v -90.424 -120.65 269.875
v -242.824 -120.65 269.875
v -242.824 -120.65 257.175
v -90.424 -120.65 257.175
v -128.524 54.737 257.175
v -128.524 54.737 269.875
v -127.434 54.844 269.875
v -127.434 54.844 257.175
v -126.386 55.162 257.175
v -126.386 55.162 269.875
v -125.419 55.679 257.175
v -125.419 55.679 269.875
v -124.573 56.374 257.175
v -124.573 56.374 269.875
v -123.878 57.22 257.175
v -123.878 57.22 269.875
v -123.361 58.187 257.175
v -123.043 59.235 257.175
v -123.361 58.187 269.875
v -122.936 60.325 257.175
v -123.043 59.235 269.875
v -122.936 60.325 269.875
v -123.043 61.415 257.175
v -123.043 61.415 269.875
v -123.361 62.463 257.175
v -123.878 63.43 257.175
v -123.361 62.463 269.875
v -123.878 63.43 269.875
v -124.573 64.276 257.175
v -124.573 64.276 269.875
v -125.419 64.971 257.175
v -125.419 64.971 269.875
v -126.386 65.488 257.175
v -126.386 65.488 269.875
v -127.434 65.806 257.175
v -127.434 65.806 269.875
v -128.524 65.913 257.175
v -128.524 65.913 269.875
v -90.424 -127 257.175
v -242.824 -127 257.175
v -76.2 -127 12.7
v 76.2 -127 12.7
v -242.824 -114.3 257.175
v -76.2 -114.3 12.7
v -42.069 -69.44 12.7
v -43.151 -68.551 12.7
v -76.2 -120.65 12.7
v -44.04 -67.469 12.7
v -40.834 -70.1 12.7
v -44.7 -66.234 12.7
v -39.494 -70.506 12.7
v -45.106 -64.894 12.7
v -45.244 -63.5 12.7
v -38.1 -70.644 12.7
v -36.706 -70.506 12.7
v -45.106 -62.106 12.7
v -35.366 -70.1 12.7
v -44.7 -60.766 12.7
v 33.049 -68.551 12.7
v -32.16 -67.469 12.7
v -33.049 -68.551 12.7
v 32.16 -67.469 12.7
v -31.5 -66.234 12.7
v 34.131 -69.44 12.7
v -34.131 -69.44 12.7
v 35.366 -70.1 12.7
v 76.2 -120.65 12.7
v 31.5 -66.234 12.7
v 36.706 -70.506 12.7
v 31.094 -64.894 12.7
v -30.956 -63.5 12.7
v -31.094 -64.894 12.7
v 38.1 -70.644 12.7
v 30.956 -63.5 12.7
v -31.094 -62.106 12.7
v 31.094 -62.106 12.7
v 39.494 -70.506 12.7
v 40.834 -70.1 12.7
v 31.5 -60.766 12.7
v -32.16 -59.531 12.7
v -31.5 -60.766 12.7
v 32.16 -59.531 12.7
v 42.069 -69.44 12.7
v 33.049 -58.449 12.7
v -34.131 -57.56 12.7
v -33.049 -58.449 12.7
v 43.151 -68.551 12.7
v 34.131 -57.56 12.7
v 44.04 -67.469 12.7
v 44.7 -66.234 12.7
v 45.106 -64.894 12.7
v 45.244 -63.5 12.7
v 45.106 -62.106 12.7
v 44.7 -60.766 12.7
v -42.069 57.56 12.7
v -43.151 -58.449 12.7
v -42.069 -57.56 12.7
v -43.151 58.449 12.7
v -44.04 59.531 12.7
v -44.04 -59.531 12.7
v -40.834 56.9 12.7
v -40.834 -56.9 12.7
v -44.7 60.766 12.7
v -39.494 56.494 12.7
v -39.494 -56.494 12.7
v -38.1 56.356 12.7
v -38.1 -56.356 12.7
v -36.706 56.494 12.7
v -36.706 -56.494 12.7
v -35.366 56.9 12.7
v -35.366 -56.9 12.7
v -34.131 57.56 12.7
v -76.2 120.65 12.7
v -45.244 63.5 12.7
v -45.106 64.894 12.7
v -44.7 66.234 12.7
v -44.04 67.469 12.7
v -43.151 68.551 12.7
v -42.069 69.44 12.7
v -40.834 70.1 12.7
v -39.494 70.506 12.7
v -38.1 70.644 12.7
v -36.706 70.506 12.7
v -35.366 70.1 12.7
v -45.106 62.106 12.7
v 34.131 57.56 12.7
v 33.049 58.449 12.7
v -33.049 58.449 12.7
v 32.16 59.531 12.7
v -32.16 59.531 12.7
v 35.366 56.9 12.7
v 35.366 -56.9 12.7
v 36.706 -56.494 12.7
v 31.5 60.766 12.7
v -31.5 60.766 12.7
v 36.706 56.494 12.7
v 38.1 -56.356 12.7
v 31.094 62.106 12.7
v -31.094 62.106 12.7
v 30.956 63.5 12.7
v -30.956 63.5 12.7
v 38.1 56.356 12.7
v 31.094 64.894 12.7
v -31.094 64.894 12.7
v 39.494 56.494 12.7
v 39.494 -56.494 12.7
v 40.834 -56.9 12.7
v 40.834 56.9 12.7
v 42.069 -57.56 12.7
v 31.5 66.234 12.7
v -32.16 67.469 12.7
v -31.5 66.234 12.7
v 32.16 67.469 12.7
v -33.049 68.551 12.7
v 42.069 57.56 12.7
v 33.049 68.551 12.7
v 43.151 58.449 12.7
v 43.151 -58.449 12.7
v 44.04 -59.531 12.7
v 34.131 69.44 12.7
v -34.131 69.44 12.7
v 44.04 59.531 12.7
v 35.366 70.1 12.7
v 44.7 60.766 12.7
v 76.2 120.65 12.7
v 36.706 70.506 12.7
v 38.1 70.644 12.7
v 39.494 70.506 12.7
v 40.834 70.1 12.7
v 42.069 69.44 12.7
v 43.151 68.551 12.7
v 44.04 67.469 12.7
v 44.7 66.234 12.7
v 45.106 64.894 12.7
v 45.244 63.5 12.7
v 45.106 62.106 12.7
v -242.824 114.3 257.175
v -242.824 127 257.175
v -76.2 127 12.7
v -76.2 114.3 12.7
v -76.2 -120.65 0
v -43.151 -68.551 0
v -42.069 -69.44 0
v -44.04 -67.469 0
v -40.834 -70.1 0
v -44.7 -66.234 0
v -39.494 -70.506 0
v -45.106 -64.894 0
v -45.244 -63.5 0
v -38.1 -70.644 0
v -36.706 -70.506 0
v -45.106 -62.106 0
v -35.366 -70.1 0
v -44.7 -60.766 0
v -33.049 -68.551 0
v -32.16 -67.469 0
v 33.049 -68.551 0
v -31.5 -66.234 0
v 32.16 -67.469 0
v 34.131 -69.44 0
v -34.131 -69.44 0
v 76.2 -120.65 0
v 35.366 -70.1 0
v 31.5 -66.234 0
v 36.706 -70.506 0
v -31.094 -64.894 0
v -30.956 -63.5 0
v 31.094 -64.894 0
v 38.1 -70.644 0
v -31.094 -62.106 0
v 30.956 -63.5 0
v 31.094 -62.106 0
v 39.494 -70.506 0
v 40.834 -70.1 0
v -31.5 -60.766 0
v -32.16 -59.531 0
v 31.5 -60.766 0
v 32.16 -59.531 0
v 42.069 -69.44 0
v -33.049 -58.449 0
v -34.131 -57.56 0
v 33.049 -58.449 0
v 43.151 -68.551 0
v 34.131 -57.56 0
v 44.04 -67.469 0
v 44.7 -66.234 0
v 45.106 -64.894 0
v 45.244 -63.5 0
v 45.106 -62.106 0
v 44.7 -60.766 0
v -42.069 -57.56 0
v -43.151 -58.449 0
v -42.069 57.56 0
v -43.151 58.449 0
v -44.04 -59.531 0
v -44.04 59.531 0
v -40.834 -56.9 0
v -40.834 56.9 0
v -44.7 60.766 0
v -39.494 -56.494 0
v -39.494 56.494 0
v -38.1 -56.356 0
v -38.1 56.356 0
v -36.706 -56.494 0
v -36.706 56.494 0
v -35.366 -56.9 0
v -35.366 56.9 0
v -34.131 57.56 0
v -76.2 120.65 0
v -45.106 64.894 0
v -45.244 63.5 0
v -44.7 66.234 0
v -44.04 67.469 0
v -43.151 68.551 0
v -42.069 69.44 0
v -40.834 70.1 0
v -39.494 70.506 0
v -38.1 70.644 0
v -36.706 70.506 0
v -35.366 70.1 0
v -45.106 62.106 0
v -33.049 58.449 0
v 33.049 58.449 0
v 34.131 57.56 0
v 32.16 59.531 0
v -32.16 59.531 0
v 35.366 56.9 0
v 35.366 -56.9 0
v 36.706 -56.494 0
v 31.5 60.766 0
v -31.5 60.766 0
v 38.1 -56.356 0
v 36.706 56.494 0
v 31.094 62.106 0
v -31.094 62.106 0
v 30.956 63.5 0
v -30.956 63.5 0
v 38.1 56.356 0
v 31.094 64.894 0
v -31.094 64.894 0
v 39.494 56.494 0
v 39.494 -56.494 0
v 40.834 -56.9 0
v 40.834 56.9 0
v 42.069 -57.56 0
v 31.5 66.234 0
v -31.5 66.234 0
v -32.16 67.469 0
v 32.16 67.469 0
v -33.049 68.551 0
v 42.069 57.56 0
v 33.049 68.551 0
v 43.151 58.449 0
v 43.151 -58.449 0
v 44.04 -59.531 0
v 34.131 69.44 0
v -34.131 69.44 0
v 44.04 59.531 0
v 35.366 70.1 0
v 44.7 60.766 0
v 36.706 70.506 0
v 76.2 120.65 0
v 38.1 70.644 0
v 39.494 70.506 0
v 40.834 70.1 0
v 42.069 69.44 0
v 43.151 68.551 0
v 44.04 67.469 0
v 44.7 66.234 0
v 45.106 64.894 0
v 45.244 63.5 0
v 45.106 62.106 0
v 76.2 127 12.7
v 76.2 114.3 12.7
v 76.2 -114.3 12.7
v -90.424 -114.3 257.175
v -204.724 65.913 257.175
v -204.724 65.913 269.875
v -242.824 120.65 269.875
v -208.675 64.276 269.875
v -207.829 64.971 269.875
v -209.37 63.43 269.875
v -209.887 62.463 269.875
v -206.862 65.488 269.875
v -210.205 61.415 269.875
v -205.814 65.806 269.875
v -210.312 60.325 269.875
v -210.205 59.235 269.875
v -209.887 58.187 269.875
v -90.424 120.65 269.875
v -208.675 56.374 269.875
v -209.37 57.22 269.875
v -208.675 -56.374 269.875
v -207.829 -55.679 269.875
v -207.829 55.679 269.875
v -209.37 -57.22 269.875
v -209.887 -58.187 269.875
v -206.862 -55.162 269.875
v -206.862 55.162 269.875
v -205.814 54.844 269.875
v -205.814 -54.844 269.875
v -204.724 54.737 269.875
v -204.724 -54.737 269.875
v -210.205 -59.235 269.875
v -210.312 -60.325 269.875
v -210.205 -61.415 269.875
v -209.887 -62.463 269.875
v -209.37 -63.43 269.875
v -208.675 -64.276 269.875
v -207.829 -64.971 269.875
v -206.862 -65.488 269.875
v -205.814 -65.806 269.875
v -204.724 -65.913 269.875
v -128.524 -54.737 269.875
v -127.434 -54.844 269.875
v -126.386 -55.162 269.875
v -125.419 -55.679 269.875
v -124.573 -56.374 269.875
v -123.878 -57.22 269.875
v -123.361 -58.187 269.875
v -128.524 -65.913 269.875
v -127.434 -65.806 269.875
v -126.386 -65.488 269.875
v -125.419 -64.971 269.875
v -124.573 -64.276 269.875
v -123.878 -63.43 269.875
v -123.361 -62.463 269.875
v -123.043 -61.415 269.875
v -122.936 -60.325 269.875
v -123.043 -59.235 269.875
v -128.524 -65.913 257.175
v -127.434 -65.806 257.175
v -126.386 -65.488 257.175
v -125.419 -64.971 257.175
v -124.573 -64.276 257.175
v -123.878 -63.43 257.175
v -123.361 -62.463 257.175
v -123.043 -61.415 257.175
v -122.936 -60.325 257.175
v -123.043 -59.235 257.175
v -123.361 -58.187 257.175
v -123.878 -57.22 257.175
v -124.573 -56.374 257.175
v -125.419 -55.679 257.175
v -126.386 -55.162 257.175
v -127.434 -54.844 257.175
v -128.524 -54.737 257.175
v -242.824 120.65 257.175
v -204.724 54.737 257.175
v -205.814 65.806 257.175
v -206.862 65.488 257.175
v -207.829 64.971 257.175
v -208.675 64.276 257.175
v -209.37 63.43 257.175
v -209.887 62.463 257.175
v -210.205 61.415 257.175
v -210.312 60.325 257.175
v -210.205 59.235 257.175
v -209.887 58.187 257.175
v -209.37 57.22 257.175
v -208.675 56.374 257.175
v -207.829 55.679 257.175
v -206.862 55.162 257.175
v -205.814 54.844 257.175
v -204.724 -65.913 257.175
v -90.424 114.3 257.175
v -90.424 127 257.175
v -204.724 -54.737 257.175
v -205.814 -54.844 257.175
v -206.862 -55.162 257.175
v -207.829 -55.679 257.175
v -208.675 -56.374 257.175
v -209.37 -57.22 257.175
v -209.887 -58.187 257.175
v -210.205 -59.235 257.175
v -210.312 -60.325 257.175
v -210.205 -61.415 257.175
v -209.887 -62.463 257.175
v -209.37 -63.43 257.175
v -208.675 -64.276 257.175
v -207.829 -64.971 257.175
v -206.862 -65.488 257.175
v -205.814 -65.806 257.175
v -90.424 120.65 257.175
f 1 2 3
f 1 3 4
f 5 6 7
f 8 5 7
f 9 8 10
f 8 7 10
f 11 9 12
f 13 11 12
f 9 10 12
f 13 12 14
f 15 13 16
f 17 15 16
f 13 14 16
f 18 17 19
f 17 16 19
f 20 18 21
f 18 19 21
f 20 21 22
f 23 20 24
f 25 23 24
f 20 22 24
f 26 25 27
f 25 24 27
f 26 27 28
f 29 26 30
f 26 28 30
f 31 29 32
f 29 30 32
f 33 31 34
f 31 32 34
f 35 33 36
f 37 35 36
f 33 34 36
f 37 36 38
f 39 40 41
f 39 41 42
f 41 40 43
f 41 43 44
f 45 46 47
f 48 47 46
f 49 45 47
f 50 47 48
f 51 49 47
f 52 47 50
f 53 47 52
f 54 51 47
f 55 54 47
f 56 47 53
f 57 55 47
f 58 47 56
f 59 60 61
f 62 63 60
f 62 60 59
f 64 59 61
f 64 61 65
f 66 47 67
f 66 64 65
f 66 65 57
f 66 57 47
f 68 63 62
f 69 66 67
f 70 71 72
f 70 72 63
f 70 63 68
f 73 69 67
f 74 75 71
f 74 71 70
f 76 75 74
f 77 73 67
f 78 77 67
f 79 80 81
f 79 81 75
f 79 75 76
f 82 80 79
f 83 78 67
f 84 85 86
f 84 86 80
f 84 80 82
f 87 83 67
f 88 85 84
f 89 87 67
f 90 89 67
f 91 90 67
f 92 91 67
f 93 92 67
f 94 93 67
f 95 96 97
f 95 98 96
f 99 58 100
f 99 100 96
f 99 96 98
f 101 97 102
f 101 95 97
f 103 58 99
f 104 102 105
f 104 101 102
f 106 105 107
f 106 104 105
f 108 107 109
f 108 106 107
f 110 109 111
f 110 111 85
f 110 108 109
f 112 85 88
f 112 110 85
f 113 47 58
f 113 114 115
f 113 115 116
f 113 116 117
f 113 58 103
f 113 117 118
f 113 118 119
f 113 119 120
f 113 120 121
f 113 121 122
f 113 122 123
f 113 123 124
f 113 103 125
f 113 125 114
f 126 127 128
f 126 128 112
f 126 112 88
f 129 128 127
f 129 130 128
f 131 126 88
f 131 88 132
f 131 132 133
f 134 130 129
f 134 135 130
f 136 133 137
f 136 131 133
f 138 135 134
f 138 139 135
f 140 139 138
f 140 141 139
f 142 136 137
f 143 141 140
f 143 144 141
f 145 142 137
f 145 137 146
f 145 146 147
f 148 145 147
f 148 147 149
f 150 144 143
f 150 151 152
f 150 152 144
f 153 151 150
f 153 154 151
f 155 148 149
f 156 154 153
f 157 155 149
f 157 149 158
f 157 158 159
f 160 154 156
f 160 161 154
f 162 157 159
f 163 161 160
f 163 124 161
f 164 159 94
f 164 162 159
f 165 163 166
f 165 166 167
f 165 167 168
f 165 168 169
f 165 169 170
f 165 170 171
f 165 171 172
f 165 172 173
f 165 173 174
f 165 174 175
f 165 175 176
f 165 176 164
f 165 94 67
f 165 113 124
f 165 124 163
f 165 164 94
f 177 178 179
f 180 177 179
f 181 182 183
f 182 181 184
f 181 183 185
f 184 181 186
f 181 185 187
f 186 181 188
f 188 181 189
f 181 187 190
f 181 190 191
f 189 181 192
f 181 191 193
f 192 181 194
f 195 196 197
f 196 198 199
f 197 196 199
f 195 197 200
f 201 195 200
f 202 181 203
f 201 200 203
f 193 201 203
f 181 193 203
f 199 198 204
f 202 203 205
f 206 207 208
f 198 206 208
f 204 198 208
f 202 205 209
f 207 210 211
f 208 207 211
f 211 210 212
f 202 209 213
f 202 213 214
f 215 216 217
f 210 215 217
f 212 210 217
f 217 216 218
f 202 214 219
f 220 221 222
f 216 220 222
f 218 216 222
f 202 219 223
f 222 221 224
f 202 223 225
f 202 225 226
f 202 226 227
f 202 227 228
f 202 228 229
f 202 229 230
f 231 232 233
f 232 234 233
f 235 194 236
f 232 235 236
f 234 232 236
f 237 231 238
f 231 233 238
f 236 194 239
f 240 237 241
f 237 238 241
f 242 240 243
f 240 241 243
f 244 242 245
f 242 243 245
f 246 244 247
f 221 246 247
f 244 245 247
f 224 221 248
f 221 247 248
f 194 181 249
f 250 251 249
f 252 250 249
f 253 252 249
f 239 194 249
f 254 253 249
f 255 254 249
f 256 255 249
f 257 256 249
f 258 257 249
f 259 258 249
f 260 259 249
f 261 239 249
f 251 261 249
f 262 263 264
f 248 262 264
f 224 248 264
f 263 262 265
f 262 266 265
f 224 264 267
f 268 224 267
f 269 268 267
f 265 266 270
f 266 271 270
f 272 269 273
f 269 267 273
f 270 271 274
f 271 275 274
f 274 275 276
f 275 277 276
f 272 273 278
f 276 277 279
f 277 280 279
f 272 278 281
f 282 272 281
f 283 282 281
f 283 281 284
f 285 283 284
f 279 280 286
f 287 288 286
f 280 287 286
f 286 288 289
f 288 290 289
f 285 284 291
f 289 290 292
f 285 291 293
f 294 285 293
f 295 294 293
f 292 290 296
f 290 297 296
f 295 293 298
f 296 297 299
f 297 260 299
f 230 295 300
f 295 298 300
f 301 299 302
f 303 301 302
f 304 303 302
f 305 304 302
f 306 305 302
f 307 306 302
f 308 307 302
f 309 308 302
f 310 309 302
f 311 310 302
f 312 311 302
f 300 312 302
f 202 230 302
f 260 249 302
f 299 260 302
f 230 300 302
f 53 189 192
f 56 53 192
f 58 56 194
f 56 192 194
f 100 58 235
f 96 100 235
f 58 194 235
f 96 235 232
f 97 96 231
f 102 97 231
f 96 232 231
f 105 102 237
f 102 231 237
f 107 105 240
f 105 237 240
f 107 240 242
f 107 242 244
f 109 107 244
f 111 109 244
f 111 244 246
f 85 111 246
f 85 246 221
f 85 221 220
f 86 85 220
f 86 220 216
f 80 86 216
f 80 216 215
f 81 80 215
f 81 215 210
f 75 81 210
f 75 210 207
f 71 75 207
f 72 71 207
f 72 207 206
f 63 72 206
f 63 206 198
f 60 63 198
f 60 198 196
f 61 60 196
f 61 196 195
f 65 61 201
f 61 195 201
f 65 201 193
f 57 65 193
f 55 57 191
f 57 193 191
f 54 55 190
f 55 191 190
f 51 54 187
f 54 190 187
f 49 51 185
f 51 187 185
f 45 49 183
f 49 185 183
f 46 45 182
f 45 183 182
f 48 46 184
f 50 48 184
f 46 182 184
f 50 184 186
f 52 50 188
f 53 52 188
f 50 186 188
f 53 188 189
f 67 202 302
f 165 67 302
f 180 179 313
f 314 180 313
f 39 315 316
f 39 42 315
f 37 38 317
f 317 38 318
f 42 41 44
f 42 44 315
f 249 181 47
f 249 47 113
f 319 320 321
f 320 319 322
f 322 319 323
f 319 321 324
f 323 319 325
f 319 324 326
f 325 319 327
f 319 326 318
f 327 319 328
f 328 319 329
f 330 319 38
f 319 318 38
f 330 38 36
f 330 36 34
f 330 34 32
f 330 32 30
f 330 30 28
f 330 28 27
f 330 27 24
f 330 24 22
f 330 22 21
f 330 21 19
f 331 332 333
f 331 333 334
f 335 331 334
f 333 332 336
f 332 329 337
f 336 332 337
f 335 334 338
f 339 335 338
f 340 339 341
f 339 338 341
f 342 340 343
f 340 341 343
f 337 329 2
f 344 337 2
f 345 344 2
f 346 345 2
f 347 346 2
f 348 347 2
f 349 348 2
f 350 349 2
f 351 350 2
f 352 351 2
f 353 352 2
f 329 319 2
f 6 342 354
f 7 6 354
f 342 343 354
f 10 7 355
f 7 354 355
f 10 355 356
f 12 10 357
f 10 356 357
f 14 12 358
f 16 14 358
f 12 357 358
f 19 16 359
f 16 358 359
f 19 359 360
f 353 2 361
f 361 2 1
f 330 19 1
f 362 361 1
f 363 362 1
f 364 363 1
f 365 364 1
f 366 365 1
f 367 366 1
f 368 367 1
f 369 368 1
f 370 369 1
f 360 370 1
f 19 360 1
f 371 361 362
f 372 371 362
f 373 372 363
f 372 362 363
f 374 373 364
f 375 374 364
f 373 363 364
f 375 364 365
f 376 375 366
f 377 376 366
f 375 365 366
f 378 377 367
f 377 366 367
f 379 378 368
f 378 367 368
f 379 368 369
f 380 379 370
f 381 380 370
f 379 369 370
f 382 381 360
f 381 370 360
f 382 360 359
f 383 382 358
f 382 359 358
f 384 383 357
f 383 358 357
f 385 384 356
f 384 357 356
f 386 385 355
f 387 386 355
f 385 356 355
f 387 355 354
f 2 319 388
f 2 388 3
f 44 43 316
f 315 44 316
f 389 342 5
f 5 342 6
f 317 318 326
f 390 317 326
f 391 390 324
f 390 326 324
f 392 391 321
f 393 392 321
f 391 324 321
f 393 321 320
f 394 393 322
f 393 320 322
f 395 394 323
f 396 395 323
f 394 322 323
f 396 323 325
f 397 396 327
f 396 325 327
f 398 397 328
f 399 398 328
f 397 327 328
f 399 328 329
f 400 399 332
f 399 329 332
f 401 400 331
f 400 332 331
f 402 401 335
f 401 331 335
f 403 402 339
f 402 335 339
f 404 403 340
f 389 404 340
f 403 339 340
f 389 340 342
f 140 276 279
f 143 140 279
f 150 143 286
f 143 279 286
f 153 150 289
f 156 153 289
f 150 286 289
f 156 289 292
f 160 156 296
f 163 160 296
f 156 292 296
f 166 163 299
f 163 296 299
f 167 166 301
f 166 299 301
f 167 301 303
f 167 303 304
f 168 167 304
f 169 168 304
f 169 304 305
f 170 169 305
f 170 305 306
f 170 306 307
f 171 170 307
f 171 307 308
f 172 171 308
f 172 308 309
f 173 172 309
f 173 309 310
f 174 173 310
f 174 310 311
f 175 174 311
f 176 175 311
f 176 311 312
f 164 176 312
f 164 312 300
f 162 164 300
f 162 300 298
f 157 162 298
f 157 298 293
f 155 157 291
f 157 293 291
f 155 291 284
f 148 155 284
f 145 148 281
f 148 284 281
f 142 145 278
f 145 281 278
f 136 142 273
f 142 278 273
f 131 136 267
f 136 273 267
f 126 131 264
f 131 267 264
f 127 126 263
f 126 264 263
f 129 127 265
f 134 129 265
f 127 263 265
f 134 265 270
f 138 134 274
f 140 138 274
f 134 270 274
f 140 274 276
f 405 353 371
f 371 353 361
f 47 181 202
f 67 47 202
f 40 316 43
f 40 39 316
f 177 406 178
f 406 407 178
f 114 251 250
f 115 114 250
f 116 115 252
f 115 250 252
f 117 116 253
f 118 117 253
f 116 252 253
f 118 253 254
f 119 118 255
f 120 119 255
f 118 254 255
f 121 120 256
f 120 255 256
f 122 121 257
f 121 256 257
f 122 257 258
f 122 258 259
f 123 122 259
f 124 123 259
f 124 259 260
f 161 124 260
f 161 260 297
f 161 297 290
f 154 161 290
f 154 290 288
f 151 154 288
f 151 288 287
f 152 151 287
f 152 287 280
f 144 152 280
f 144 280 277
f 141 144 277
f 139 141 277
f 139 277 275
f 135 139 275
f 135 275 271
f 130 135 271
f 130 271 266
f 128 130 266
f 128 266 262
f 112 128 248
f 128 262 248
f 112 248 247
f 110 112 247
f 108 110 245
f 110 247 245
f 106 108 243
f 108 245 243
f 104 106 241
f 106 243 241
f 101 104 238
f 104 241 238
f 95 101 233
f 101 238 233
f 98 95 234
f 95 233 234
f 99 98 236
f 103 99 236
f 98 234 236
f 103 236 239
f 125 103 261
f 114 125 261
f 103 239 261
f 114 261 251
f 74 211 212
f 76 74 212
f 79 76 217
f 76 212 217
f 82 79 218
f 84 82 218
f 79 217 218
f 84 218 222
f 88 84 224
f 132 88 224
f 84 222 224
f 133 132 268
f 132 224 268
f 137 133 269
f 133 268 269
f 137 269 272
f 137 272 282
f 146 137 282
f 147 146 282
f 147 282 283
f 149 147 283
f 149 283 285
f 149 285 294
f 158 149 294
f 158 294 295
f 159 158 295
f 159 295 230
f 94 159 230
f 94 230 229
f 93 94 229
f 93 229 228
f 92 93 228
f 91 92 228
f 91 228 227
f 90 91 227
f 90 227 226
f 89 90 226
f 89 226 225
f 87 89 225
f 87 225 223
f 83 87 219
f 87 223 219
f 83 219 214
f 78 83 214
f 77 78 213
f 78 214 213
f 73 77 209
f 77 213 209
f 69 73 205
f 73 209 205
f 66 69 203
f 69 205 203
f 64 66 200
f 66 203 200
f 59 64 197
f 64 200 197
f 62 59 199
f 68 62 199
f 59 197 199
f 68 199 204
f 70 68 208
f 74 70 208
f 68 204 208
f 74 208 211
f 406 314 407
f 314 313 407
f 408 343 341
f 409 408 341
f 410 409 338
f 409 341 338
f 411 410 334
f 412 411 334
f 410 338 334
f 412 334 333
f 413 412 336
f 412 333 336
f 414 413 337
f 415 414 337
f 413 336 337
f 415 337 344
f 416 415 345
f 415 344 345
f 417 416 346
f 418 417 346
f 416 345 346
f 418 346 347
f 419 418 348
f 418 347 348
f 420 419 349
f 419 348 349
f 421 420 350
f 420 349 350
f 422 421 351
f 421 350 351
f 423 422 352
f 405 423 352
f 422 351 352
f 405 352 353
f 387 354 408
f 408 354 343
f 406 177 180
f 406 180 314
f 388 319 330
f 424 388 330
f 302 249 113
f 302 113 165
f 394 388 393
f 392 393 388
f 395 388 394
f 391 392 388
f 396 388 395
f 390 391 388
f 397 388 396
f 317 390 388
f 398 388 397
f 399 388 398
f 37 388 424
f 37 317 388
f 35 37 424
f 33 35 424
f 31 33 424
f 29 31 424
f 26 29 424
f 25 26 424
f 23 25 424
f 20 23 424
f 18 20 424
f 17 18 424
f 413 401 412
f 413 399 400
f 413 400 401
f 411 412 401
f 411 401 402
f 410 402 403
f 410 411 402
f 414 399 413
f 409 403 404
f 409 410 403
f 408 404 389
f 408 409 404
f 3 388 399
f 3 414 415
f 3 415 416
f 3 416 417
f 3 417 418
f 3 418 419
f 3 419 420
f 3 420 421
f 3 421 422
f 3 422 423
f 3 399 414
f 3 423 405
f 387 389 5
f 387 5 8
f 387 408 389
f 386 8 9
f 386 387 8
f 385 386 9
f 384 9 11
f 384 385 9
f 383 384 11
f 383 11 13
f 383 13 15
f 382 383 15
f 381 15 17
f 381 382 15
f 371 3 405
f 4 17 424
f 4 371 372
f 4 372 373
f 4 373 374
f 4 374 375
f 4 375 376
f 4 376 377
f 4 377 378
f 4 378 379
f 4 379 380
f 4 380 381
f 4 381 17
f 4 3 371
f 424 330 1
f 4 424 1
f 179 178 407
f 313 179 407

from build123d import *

# Parameters (mm, degrees)
F0_W      = 152.4
F0_H      = 241.3
F1_DEPTH  = 12.7
F3_D      = 14.2875
F5_W      = 152.4
F5_H      = 241.3
F6_DEPTH  = 12.7
F8_DEPTH  = 269.876
F10_DEPTH = 6.35


with BuildPart() as f1:
    # F0 (on Top) → F1 (new body)
    with BuildSketch(Plane.XY):
        Rectangle(F0_W, F0_H)
    extrude(amount=F1_DEPTH)

    # F3 (through all)
    with Locations(Plane.XY.offset(12.7)):
        with Locations((-38.1, 63.5), (38.1, 63.5), (-38.1, -63.5), (38.1, -63.5)):
            Hole(F3_D / 2)


with BuildPart() as f6:
    # F5 (on offset) → F6 (new body)
    with BuildSketch(Plane(origin=(0, 0, 269.875), x_dir=(1, 0, 0), z_dir=(0, 0, -1))):
        with Locations((-166.624, 0)):
            Rectangle(F5_W, F5_H)
    extrude(amount=F6_DEPTH)

    # F7 (on face) → F8 (cut, through all)
    with BuildSketch(Plane.XY.offset(269.875)):
        with BuildLine():
            ThreePointArc((-204.724, 65.913), (-210.312, 60.325), (-204.724, 54.737))
            Line((-204.724, 54.737), (-128.524, 54.737))
            ThreePointArc((-128.524, 54.737), (-122.936, 60.325), (-128.524, 65.913))
            Line((-128.524, 65.913), (-204.724, 65.913))
        make_face()
        with BuildLine():
            Line((-128.524, -54.737), (-204.724, -54.737))
            ThreePointArc((-204.724, -54.737), (-210.312, -60.325), (-204.724, -65.913))
            Line((-204.724, -65.913), (-128.524, -65.913))
            ThreePointArc((-128.524, -65.913), (-122.936, -60.325), (-128.524, -54.737))
        make_face()
    extrude(amount=-F8_DEPTH, mode=Mode.SUBTRACT)


with BuildPart() as f10:
    # F9 (on face) → F10 (new body, symmetric)
    with BuildSketch(Plane.XZ.offset(120.65)):
        Polygon((-90.424, 257.175), (-242.824, 257.175), (-76.2, 12.7), (76.2, 12.7), align=None)
    extrude(amount=F10_DEPTH, both=True)


with BuildPart() as f11_1:
    # F11: instance of F10
    add(f10.part.mirror(Plane.XZ))


solid = Compound([f1.part, f6.part, f10.part, f11_1.part])
